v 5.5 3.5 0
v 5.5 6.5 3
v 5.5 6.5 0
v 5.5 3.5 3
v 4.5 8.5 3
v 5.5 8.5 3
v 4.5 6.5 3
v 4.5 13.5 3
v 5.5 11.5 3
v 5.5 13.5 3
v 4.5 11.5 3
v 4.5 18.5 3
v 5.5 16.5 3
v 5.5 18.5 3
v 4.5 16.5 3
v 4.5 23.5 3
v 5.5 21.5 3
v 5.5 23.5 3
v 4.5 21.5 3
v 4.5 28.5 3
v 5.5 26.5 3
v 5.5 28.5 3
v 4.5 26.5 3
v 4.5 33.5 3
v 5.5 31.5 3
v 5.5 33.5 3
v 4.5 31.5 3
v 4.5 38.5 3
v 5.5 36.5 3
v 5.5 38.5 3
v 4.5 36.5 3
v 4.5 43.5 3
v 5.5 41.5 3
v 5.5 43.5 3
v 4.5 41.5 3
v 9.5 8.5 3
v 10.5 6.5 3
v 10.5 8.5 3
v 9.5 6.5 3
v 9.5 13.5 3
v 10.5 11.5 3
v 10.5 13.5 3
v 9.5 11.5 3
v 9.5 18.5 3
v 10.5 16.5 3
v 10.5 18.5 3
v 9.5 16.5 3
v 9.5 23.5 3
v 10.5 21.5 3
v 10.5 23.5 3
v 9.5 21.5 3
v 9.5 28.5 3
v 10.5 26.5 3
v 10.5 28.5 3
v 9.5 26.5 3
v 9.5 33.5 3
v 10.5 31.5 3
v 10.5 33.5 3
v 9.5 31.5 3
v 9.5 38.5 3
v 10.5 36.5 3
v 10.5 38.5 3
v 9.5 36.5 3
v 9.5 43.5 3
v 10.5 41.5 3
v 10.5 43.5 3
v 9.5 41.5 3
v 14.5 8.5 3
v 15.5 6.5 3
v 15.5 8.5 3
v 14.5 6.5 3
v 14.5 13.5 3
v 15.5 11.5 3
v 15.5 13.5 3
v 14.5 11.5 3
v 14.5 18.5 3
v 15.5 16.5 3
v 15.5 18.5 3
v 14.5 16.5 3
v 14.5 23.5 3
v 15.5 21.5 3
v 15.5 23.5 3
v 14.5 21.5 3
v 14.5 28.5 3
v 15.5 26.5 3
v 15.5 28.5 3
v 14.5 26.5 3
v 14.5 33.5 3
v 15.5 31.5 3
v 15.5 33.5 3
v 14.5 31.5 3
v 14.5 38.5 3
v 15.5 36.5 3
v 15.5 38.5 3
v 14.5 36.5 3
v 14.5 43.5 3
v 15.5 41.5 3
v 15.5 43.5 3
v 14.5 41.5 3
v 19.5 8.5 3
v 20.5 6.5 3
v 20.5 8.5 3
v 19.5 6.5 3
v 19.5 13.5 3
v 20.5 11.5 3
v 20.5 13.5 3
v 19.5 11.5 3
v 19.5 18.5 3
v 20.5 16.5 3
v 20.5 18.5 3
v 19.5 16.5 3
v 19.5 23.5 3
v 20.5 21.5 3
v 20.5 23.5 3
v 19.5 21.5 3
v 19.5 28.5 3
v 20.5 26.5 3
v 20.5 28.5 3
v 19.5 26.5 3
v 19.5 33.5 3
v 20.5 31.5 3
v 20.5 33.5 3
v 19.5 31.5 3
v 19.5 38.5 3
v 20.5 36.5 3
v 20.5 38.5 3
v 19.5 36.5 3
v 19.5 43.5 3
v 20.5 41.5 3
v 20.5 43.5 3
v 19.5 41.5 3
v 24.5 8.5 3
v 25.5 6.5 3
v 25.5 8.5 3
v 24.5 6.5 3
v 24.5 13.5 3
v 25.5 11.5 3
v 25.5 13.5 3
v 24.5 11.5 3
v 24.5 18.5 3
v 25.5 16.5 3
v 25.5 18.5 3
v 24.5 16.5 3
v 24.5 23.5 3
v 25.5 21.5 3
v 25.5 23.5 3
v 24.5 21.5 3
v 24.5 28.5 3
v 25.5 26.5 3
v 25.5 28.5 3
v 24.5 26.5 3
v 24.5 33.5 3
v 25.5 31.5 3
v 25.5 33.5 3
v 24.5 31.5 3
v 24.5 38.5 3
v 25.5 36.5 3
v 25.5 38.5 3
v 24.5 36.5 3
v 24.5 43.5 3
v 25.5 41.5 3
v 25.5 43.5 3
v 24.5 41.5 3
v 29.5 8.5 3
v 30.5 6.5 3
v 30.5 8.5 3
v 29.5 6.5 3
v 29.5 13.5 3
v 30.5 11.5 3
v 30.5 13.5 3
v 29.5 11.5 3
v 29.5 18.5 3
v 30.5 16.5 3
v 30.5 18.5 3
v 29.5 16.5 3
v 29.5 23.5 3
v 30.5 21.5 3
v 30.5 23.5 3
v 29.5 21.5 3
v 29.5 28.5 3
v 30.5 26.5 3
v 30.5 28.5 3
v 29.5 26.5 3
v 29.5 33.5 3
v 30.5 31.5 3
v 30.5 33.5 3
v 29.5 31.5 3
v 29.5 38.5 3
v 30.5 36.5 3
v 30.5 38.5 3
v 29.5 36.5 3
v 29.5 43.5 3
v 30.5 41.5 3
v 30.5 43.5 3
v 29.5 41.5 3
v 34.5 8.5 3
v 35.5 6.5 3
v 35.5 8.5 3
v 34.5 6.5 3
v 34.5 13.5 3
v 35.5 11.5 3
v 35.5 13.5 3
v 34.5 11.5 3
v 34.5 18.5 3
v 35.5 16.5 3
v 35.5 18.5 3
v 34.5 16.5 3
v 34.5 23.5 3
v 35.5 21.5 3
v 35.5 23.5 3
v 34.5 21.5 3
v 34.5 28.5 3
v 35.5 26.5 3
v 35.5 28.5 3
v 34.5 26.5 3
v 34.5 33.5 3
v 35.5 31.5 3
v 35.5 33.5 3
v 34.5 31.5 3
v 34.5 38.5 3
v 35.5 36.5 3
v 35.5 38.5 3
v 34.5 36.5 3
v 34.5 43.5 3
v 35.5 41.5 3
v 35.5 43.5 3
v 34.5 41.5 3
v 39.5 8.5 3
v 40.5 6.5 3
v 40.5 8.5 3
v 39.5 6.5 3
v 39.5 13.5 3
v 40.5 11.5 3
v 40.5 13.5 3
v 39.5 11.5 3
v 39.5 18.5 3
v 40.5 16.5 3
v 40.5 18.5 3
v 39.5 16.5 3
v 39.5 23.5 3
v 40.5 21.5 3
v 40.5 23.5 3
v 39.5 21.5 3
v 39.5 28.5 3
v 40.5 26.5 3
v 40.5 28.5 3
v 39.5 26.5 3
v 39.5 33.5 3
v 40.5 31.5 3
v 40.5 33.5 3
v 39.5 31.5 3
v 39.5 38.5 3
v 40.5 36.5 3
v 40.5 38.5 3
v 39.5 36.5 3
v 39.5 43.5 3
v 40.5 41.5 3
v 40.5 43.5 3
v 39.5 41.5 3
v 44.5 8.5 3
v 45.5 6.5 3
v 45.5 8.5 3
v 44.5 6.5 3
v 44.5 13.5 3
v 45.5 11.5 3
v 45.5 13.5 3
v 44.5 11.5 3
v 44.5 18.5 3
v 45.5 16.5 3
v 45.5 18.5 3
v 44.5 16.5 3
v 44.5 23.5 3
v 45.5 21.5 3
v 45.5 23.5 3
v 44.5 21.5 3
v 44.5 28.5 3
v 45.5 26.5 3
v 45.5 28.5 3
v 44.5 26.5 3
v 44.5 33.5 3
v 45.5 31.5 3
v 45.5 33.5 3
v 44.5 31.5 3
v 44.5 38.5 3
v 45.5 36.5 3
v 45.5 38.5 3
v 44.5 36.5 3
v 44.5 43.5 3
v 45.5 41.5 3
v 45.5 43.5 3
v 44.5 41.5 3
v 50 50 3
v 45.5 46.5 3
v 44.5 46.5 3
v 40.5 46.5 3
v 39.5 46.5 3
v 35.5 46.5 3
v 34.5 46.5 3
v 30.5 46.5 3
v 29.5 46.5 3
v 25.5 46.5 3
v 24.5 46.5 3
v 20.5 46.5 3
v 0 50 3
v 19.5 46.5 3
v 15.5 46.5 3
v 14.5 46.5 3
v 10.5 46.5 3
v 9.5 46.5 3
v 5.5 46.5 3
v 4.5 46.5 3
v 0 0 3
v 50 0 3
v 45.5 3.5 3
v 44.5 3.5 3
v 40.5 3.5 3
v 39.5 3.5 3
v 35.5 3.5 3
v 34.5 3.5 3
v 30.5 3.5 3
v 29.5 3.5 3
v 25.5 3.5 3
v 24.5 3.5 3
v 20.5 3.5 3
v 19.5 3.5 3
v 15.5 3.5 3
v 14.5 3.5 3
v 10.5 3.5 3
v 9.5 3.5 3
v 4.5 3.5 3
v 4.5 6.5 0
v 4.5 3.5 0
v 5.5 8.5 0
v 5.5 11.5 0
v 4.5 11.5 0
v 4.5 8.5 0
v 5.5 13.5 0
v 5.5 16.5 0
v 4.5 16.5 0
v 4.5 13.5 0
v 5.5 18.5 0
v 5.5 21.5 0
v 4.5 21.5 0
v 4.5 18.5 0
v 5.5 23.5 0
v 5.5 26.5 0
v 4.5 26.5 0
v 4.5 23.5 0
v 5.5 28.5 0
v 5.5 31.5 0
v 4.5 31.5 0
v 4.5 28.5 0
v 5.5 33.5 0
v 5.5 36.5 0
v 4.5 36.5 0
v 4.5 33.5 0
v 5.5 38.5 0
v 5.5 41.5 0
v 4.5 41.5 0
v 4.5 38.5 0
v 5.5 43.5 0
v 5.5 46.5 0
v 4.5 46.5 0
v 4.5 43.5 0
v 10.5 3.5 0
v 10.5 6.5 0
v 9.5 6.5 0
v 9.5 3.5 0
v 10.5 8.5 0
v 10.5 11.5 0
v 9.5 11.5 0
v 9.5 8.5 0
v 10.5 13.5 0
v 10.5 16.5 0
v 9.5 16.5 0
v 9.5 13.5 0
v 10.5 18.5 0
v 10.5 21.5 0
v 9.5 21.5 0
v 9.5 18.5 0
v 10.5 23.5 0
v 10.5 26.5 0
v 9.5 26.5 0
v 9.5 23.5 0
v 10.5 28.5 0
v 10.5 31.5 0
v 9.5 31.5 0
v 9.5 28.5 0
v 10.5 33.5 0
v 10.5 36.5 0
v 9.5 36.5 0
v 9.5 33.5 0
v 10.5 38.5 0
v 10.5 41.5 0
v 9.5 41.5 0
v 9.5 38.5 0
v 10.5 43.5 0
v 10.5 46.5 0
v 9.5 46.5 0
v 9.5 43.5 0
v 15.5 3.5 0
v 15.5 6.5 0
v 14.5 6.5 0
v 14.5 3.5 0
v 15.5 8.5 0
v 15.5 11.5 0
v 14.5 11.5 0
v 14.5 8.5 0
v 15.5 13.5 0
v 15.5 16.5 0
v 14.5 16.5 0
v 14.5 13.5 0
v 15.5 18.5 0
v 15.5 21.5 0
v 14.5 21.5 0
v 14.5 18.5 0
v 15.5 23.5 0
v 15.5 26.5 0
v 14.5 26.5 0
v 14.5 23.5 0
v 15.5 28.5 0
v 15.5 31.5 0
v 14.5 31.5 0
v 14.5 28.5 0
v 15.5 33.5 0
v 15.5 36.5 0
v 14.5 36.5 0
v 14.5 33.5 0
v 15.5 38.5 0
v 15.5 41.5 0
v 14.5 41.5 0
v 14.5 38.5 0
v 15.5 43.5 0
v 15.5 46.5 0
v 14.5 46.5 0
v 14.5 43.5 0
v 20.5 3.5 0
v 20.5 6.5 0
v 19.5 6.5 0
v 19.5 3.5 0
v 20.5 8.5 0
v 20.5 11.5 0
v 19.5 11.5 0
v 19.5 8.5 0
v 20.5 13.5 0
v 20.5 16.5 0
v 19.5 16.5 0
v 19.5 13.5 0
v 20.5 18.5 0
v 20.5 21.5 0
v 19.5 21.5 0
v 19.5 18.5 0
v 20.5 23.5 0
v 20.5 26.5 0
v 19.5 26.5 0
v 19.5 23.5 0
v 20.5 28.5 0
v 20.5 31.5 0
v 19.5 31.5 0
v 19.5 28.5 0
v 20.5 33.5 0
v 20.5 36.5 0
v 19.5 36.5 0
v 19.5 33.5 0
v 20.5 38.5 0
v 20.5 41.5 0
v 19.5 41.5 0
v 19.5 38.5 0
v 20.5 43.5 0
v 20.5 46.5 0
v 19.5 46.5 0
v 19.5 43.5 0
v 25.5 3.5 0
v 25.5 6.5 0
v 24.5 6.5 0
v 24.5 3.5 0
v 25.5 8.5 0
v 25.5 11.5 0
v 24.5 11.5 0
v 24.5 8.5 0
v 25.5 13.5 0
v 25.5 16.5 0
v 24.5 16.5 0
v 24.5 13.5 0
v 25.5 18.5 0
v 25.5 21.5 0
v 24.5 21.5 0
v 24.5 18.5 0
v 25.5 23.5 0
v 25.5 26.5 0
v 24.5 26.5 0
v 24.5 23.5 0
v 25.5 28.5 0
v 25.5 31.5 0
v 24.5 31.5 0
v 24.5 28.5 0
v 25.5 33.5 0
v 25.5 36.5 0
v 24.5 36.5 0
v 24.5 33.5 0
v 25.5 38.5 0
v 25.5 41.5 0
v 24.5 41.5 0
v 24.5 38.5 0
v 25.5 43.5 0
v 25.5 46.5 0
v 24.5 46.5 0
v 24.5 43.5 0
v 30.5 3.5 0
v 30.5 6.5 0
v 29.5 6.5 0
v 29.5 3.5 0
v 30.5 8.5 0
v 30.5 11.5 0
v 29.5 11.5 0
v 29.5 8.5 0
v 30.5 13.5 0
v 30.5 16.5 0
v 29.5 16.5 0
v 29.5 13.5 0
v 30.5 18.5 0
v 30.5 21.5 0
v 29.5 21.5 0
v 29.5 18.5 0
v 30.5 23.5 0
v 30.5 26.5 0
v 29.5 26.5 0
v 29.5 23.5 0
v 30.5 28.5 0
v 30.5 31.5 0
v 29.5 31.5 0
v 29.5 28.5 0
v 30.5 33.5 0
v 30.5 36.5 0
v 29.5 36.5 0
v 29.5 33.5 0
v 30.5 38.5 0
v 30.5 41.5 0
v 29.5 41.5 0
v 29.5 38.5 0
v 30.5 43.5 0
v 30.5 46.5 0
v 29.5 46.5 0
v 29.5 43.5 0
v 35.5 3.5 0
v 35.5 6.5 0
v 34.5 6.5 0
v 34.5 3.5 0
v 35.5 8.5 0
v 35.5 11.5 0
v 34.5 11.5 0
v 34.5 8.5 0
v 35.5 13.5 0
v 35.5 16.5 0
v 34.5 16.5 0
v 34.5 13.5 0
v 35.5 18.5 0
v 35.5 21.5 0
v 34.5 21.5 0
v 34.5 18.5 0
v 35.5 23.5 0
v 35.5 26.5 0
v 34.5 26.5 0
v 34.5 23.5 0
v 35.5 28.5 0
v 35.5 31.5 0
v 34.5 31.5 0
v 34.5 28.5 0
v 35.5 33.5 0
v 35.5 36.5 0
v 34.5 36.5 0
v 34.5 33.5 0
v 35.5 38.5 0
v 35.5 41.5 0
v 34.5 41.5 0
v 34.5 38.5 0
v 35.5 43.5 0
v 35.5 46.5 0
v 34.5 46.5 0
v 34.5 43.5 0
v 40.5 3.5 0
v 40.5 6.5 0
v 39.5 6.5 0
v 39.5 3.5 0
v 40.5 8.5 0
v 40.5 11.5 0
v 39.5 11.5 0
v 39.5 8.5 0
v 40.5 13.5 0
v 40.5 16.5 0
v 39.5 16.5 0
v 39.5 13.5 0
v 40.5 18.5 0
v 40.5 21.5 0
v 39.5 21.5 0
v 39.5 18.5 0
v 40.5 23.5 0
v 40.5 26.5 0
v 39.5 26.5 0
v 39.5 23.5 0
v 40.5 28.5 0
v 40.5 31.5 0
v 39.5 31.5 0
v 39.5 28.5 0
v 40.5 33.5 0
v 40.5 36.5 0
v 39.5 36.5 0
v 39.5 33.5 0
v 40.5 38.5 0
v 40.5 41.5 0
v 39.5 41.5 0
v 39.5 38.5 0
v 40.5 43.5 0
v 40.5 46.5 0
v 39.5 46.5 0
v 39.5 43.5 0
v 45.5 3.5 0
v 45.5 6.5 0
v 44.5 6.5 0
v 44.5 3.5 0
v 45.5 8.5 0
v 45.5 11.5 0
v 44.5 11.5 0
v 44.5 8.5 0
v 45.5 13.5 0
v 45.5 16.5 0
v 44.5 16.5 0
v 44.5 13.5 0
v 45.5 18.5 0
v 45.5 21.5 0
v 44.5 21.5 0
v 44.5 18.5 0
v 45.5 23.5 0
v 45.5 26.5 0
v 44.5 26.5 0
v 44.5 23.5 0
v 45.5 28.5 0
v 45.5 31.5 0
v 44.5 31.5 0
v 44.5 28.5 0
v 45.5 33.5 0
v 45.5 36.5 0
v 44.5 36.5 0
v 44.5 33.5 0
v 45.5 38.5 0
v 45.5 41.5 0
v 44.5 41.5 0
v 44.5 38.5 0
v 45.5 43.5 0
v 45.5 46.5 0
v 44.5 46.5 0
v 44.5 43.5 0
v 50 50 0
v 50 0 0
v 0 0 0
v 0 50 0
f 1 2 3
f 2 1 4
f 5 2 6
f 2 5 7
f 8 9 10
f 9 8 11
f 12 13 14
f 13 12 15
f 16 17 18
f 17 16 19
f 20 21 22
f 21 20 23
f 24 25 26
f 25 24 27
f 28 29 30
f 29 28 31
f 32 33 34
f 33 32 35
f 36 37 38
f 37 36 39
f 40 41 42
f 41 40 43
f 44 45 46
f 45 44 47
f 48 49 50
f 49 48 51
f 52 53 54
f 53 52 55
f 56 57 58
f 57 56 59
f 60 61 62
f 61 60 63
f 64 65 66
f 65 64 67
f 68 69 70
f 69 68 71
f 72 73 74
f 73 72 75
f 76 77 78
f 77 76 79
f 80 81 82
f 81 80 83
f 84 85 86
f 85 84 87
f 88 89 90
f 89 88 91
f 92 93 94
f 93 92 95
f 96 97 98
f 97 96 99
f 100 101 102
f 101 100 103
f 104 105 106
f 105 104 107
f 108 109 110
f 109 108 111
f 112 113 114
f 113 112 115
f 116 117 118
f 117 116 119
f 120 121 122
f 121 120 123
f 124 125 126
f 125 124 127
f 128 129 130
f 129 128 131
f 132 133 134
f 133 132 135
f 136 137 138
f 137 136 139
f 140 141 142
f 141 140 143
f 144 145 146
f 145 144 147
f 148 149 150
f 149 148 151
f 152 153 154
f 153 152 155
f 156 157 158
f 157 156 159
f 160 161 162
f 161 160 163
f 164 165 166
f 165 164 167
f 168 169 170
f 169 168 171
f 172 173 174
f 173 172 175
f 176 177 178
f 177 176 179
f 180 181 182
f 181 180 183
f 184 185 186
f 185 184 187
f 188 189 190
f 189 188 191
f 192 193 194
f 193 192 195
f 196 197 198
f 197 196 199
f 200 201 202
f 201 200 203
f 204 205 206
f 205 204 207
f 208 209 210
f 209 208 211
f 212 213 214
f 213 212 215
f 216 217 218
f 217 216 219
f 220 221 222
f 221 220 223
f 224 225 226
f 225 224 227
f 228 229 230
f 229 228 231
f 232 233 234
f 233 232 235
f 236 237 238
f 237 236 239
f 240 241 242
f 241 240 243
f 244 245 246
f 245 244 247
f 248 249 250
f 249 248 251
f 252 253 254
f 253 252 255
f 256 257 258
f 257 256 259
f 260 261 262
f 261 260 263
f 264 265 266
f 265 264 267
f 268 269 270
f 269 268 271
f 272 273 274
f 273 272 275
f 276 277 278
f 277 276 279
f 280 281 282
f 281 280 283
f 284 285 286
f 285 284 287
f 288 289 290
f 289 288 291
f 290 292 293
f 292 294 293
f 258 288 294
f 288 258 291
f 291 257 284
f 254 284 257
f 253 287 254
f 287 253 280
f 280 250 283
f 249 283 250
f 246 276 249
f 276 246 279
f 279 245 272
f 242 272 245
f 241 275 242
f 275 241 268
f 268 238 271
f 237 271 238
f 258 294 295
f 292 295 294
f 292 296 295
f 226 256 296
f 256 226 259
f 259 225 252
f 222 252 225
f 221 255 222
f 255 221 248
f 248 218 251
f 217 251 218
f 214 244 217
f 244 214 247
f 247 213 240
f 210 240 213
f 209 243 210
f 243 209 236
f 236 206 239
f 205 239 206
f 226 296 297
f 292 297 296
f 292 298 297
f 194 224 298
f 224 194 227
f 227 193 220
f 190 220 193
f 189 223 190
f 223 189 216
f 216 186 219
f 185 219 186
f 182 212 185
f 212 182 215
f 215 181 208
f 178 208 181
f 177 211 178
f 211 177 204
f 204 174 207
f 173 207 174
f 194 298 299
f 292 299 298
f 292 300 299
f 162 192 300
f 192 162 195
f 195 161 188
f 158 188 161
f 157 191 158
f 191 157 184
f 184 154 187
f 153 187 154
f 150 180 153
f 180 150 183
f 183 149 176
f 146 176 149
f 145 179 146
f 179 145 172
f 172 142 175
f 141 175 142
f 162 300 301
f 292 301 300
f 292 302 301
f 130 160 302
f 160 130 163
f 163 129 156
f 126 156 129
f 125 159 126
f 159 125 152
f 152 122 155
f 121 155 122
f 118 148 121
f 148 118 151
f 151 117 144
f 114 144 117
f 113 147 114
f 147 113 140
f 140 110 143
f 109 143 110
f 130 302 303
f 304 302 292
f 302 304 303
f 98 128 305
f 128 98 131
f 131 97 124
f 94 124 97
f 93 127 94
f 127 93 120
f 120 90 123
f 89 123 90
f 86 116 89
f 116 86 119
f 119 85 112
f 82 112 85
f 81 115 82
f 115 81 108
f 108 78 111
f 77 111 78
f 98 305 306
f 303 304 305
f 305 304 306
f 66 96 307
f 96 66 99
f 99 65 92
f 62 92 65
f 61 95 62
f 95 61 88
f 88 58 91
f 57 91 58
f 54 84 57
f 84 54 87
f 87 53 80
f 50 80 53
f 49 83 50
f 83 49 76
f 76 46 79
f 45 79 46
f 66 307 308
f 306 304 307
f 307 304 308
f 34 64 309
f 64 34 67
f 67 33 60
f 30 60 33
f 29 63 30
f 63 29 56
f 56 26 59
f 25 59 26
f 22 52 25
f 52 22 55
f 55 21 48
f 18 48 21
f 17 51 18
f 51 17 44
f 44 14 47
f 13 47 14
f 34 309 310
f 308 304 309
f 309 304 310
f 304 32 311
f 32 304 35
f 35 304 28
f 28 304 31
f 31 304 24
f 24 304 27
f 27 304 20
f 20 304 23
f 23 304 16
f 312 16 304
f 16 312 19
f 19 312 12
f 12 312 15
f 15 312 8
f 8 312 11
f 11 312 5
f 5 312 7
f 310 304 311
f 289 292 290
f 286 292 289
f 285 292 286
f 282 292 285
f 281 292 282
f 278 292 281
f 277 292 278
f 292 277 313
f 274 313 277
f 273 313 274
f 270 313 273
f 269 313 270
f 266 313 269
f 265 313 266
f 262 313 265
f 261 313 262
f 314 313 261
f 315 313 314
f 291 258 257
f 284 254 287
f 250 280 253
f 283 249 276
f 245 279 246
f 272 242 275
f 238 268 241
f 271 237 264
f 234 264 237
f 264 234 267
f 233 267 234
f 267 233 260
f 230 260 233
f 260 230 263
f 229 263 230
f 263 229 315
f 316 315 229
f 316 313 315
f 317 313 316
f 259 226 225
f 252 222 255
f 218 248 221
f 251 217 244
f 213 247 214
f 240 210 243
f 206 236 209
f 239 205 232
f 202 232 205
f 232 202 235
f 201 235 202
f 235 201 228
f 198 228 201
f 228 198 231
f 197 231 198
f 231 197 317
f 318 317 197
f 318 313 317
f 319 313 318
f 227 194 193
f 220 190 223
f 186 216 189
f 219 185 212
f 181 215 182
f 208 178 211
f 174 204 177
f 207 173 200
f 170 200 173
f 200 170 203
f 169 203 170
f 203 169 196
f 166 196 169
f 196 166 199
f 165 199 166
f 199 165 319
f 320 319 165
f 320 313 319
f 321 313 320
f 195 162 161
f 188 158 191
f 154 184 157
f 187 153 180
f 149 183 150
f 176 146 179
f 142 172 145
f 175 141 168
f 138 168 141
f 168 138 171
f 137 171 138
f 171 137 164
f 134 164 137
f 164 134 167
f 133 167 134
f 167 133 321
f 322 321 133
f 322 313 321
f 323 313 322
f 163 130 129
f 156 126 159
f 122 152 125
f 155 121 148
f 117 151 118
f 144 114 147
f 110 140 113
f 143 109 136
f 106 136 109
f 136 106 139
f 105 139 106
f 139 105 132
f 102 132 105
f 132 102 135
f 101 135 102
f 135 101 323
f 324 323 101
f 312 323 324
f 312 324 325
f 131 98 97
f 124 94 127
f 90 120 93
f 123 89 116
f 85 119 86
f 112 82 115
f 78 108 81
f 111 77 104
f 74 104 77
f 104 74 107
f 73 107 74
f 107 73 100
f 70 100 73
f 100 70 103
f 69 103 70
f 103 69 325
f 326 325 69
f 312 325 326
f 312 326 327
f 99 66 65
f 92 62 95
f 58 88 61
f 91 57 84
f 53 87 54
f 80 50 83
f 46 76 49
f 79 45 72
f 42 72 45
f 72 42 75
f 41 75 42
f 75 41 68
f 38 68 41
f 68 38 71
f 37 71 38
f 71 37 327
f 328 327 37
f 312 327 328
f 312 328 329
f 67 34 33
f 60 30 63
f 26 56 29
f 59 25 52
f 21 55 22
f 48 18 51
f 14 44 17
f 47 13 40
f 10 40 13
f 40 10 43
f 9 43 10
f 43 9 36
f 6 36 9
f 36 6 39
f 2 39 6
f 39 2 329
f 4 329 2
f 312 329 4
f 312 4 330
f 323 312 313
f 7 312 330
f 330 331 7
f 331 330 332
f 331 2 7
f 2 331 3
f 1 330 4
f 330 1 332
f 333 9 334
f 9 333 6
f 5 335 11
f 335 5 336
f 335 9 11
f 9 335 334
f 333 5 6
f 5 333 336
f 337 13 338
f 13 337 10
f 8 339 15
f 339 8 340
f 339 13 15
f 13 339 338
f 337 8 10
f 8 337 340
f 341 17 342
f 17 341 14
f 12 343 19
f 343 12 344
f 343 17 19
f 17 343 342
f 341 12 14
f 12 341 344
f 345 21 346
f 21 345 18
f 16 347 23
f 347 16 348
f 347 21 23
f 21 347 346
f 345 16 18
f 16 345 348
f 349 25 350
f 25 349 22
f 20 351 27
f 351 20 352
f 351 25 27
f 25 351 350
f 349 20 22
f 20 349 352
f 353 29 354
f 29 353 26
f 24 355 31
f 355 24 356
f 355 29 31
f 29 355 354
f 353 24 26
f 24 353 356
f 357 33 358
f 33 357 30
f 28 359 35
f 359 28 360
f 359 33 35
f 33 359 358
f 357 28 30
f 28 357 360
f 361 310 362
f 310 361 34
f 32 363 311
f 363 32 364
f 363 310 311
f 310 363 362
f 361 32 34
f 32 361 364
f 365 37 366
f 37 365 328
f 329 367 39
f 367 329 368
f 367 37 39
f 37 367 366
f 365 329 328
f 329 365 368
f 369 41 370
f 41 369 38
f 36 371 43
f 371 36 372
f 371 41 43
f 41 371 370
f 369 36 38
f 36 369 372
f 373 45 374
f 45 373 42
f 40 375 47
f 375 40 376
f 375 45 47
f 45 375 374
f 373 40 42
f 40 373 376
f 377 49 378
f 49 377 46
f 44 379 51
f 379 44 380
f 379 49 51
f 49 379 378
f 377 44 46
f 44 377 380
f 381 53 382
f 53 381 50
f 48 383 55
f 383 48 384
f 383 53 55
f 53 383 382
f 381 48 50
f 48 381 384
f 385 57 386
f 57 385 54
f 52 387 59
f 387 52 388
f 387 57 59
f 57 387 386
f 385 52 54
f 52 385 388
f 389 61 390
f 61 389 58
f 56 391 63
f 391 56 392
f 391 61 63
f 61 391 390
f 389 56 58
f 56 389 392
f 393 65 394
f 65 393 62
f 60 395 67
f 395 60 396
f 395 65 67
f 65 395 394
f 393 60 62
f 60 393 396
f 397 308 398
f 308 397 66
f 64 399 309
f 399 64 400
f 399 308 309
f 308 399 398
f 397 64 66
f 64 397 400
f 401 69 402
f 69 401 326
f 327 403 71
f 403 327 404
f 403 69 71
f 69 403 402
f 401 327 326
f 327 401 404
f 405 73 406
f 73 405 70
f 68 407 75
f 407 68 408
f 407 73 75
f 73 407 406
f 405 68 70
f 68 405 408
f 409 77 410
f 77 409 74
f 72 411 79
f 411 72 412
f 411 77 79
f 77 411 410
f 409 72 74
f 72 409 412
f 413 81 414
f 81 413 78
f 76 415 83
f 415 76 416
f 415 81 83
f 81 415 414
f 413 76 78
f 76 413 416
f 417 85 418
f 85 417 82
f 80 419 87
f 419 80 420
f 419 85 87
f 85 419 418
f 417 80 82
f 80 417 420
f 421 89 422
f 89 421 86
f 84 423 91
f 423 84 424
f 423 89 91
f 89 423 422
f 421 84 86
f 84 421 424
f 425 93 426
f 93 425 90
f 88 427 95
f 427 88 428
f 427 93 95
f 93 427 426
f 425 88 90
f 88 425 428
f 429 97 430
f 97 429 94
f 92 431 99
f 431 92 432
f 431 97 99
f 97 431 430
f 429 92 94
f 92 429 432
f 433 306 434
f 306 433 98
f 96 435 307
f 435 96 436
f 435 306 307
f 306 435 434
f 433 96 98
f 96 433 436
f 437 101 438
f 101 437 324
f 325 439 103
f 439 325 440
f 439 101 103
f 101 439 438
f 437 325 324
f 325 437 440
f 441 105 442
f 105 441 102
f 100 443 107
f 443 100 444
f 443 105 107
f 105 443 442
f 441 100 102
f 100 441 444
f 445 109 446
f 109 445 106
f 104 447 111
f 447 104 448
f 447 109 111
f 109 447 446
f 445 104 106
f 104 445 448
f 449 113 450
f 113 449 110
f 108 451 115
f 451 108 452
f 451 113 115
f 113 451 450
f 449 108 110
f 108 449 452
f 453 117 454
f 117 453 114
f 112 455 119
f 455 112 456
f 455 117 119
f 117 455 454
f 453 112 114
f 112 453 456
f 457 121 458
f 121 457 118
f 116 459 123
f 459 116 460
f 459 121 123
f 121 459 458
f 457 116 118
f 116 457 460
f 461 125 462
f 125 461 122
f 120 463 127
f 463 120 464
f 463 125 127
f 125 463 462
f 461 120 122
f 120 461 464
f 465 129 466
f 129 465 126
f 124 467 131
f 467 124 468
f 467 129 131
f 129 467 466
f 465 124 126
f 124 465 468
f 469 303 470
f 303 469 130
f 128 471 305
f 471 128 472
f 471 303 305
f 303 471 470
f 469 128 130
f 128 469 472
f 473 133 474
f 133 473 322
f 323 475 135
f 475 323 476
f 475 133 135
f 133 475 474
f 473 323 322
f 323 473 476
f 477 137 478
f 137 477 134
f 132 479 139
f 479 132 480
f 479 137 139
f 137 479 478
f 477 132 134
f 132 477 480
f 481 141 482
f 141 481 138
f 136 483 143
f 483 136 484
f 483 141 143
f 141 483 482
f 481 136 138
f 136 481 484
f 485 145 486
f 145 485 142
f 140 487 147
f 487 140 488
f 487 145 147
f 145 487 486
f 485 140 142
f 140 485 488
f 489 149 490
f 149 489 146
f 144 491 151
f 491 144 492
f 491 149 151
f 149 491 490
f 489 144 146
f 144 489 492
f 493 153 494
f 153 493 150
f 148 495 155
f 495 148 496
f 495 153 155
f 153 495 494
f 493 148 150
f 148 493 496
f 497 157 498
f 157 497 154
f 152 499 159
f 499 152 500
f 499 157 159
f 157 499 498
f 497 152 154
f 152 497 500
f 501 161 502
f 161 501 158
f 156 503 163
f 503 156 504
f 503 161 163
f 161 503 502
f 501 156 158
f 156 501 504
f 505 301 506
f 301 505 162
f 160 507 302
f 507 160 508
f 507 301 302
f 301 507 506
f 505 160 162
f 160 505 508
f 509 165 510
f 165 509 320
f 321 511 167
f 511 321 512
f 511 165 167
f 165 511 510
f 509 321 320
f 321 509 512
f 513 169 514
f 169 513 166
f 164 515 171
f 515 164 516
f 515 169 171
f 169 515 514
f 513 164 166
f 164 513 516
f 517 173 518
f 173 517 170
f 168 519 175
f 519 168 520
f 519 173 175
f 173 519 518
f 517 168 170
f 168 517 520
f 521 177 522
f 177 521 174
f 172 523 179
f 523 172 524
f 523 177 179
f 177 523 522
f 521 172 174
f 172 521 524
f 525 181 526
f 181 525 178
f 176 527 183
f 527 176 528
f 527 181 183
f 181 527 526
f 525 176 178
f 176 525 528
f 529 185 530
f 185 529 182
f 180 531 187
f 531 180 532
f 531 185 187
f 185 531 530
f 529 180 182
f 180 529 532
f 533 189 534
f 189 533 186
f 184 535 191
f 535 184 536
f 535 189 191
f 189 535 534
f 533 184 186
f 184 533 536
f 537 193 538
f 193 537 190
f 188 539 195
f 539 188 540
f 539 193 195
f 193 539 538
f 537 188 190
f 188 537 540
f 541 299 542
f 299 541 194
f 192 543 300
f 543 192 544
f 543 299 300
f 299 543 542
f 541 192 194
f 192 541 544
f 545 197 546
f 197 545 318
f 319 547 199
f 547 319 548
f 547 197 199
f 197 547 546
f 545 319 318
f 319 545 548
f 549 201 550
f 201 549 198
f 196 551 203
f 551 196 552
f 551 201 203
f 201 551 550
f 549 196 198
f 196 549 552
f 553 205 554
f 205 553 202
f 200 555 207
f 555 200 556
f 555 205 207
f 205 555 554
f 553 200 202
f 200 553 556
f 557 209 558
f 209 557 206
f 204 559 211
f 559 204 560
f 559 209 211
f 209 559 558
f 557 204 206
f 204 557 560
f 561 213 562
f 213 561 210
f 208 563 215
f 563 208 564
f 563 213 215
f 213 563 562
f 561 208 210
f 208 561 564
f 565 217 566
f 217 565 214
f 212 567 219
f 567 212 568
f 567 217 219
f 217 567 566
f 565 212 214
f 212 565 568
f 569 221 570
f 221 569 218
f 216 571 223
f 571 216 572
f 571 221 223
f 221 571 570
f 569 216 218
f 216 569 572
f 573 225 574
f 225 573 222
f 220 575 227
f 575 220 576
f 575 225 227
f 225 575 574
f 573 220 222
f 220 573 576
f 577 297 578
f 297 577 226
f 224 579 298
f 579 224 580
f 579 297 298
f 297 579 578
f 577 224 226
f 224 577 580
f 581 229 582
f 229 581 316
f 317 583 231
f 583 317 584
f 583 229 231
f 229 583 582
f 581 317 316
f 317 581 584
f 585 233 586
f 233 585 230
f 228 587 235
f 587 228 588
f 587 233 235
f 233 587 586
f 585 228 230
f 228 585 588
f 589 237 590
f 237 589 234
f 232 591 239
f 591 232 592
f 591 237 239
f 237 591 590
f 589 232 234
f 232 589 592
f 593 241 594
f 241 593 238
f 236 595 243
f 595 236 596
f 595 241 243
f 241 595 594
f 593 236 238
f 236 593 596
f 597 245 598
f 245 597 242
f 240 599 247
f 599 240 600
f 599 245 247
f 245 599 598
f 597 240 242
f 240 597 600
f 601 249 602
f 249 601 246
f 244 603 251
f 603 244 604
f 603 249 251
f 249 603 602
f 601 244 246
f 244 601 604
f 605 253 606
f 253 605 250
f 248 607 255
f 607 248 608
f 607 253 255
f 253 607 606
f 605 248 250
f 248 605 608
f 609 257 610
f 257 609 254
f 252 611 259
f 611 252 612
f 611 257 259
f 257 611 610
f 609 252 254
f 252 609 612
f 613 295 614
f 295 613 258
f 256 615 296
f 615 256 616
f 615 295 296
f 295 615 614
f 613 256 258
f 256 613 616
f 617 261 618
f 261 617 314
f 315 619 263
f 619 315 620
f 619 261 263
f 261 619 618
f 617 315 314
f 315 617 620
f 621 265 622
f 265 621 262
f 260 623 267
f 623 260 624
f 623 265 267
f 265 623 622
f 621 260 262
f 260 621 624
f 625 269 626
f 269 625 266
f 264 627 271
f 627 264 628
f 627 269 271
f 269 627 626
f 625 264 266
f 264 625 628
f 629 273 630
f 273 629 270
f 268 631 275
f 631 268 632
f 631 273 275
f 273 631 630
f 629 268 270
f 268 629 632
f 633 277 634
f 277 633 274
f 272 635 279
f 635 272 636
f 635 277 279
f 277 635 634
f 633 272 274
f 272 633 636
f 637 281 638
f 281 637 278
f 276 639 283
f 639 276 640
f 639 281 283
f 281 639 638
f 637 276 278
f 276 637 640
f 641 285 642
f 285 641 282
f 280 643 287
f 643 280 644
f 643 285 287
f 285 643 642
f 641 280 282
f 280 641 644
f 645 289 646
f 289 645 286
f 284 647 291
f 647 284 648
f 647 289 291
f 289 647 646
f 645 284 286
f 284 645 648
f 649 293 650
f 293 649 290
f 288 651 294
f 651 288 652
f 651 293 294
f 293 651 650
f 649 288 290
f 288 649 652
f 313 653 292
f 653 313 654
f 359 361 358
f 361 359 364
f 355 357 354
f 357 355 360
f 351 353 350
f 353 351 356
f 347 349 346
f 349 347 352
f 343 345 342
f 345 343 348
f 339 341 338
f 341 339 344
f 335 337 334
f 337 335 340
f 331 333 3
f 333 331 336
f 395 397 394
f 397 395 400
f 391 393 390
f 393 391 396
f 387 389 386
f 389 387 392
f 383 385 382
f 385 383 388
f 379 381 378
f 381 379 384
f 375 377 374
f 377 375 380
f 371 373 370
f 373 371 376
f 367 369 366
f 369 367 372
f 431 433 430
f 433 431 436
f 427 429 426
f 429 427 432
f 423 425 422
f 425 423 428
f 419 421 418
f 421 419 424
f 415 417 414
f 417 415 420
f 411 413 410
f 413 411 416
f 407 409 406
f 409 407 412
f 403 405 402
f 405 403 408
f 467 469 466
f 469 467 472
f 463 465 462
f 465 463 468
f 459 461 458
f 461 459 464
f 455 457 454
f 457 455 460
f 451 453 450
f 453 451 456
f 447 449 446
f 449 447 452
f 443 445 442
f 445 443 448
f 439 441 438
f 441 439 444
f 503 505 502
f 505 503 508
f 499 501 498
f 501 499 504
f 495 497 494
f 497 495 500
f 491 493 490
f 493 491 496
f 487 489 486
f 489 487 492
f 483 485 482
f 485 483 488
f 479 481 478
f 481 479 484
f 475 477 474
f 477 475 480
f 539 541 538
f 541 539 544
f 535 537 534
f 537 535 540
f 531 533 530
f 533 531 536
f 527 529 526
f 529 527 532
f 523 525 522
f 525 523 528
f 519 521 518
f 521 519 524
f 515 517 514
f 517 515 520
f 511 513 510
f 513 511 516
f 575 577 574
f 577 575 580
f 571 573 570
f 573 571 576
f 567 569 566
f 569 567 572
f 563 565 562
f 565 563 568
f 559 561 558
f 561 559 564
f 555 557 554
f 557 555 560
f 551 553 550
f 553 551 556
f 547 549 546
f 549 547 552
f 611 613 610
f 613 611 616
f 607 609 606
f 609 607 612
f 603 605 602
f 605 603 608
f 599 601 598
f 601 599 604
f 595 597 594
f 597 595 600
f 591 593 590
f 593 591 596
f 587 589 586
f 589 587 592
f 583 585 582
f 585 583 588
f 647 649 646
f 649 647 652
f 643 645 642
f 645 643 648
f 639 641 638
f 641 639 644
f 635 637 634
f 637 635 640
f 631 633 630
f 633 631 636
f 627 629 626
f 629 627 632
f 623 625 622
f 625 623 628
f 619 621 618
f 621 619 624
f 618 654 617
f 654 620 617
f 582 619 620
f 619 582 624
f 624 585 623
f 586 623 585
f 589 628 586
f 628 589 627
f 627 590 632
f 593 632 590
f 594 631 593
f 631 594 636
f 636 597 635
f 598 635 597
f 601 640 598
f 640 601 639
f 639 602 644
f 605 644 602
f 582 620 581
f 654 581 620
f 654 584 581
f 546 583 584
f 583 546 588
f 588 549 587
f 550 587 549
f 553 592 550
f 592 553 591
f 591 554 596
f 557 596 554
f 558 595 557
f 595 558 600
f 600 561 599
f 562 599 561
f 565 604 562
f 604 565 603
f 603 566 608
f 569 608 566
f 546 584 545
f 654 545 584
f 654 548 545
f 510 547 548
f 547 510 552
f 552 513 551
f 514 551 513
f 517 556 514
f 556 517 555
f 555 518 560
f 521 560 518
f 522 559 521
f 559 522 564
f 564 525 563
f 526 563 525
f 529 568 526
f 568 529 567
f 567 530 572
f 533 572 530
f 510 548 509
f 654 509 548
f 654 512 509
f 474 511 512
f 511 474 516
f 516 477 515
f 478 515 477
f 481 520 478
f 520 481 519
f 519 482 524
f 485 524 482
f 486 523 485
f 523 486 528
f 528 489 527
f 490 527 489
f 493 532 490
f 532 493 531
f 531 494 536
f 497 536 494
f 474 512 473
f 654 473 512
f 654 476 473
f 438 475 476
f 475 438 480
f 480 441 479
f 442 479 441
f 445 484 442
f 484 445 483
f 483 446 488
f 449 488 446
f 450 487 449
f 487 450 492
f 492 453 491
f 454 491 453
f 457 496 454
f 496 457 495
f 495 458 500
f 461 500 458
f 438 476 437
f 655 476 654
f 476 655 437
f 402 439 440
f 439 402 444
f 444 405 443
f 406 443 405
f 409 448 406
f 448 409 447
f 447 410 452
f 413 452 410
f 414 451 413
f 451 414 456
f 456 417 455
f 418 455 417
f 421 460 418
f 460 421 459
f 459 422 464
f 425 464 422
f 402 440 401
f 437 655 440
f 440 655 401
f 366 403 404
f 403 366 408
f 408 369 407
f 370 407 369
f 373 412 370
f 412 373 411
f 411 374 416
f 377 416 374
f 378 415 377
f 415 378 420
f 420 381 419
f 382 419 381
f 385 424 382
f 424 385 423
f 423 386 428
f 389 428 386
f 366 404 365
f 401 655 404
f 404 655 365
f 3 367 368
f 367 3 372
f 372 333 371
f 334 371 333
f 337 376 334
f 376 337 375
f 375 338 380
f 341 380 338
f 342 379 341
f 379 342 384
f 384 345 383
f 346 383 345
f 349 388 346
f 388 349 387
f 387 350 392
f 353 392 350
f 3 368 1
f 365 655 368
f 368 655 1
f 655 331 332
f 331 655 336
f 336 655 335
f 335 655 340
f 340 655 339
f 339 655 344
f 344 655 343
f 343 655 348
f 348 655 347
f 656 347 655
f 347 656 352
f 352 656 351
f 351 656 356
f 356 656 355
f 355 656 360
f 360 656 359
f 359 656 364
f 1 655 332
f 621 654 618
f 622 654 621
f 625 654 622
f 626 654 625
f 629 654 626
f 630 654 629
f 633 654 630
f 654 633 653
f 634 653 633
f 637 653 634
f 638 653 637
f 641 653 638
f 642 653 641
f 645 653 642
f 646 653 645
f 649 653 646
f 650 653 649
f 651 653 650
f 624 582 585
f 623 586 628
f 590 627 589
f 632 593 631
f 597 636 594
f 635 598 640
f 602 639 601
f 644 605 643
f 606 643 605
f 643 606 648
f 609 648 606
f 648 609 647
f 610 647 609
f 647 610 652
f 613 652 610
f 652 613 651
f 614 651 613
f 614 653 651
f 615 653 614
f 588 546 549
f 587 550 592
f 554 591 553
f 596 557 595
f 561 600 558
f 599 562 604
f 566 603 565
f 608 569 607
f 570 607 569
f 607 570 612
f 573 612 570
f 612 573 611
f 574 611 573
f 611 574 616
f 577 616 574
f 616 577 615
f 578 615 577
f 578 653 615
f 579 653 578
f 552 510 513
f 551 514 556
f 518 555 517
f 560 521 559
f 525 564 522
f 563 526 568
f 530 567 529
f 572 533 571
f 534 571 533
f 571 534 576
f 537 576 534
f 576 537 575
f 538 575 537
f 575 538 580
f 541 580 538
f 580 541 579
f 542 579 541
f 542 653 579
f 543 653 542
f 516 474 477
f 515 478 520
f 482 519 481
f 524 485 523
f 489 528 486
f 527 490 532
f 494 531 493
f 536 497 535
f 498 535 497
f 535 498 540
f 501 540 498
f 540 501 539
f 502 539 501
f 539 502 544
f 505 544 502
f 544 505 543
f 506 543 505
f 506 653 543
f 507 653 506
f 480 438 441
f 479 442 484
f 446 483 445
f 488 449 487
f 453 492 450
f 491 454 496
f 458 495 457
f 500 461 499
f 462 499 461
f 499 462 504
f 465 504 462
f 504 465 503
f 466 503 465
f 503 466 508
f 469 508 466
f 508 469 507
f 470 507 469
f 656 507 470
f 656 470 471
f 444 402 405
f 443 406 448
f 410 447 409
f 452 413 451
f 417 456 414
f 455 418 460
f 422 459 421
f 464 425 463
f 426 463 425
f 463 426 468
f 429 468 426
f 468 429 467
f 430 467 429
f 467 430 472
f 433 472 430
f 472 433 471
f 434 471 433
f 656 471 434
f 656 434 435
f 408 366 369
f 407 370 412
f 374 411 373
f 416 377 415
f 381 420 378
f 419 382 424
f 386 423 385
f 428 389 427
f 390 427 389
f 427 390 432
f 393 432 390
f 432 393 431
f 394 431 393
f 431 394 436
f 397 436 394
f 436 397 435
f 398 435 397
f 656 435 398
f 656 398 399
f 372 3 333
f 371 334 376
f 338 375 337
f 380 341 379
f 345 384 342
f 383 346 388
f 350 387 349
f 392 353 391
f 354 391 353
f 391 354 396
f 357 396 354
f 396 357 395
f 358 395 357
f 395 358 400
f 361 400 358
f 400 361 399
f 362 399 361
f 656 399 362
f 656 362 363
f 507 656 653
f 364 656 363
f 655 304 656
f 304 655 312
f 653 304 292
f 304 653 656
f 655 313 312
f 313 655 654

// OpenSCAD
/*	Zip-Plate Custome Plate
	Created by Newton Robinson

	Zip-Plate is a construction set that is connected with 4" zip ties
	
	My plan is to create a set of pieces that can be used as a platform for robots.
*/

//Height of the Zip-Plate in mm: 
Height = 3;				// [1:5]	
//Length should be in a multiple of Spacing: 
Length = 50;			// [10:200:5] 
//Width should be in a multiple of Spacing: 
Width = 50;				// [10:200] 
//Spacing between holes in mm: 
Spacing = 5;			// [5:20]
// Height of the zip tie (Flat part): 
Zip_Tie_Height = 1;	// [1:2] 
// Width of the zip tie: 
Zip_Tie_Width = 3;	// [3:5] 

difference() {
	cube(size = [Length, Width, Height], center = false);
	for (x = [Spacing : Spacing : Length - Spacing] )
	{
		for (y = [Spacing : Spacing : Width - Spacing] )
		{
			translate ([ x , y , 0 ]) cube( size = [Zip_Tie_Height, Zip_Tie_Width, Height * 2], center = true);
		}
	}
}
